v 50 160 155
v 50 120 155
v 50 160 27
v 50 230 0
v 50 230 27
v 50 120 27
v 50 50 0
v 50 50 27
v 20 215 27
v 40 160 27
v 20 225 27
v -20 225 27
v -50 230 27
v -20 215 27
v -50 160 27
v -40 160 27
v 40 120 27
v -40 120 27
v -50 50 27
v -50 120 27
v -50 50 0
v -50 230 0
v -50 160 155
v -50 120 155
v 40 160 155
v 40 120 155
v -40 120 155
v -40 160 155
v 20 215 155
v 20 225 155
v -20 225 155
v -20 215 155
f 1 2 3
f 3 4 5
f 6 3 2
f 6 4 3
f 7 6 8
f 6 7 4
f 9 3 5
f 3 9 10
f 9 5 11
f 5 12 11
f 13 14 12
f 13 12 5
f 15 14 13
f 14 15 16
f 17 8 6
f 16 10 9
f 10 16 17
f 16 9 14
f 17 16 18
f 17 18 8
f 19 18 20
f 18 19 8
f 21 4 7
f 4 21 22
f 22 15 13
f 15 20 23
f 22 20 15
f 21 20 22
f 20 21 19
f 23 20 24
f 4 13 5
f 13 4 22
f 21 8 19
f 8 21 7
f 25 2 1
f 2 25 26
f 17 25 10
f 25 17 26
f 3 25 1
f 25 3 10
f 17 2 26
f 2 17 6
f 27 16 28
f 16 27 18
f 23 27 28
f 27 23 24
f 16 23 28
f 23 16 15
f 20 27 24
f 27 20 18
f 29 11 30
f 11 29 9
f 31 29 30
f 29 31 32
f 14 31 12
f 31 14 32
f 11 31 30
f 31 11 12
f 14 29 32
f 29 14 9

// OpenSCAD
union() {
  translate([0, 50+90, 13.5])
    cube([ 100, 180, 27], center=true);
  translate([ 45, 50+90, 64+27])
    cube([ 10, 40, 128], center=true);
  translate([ -45, 50+90, 64+27])
    cube([ 10, 40, 128], center=true);
  translate([ 0, 220, 64+27])
    cube([ 40, 10, 128], center=true);
}
